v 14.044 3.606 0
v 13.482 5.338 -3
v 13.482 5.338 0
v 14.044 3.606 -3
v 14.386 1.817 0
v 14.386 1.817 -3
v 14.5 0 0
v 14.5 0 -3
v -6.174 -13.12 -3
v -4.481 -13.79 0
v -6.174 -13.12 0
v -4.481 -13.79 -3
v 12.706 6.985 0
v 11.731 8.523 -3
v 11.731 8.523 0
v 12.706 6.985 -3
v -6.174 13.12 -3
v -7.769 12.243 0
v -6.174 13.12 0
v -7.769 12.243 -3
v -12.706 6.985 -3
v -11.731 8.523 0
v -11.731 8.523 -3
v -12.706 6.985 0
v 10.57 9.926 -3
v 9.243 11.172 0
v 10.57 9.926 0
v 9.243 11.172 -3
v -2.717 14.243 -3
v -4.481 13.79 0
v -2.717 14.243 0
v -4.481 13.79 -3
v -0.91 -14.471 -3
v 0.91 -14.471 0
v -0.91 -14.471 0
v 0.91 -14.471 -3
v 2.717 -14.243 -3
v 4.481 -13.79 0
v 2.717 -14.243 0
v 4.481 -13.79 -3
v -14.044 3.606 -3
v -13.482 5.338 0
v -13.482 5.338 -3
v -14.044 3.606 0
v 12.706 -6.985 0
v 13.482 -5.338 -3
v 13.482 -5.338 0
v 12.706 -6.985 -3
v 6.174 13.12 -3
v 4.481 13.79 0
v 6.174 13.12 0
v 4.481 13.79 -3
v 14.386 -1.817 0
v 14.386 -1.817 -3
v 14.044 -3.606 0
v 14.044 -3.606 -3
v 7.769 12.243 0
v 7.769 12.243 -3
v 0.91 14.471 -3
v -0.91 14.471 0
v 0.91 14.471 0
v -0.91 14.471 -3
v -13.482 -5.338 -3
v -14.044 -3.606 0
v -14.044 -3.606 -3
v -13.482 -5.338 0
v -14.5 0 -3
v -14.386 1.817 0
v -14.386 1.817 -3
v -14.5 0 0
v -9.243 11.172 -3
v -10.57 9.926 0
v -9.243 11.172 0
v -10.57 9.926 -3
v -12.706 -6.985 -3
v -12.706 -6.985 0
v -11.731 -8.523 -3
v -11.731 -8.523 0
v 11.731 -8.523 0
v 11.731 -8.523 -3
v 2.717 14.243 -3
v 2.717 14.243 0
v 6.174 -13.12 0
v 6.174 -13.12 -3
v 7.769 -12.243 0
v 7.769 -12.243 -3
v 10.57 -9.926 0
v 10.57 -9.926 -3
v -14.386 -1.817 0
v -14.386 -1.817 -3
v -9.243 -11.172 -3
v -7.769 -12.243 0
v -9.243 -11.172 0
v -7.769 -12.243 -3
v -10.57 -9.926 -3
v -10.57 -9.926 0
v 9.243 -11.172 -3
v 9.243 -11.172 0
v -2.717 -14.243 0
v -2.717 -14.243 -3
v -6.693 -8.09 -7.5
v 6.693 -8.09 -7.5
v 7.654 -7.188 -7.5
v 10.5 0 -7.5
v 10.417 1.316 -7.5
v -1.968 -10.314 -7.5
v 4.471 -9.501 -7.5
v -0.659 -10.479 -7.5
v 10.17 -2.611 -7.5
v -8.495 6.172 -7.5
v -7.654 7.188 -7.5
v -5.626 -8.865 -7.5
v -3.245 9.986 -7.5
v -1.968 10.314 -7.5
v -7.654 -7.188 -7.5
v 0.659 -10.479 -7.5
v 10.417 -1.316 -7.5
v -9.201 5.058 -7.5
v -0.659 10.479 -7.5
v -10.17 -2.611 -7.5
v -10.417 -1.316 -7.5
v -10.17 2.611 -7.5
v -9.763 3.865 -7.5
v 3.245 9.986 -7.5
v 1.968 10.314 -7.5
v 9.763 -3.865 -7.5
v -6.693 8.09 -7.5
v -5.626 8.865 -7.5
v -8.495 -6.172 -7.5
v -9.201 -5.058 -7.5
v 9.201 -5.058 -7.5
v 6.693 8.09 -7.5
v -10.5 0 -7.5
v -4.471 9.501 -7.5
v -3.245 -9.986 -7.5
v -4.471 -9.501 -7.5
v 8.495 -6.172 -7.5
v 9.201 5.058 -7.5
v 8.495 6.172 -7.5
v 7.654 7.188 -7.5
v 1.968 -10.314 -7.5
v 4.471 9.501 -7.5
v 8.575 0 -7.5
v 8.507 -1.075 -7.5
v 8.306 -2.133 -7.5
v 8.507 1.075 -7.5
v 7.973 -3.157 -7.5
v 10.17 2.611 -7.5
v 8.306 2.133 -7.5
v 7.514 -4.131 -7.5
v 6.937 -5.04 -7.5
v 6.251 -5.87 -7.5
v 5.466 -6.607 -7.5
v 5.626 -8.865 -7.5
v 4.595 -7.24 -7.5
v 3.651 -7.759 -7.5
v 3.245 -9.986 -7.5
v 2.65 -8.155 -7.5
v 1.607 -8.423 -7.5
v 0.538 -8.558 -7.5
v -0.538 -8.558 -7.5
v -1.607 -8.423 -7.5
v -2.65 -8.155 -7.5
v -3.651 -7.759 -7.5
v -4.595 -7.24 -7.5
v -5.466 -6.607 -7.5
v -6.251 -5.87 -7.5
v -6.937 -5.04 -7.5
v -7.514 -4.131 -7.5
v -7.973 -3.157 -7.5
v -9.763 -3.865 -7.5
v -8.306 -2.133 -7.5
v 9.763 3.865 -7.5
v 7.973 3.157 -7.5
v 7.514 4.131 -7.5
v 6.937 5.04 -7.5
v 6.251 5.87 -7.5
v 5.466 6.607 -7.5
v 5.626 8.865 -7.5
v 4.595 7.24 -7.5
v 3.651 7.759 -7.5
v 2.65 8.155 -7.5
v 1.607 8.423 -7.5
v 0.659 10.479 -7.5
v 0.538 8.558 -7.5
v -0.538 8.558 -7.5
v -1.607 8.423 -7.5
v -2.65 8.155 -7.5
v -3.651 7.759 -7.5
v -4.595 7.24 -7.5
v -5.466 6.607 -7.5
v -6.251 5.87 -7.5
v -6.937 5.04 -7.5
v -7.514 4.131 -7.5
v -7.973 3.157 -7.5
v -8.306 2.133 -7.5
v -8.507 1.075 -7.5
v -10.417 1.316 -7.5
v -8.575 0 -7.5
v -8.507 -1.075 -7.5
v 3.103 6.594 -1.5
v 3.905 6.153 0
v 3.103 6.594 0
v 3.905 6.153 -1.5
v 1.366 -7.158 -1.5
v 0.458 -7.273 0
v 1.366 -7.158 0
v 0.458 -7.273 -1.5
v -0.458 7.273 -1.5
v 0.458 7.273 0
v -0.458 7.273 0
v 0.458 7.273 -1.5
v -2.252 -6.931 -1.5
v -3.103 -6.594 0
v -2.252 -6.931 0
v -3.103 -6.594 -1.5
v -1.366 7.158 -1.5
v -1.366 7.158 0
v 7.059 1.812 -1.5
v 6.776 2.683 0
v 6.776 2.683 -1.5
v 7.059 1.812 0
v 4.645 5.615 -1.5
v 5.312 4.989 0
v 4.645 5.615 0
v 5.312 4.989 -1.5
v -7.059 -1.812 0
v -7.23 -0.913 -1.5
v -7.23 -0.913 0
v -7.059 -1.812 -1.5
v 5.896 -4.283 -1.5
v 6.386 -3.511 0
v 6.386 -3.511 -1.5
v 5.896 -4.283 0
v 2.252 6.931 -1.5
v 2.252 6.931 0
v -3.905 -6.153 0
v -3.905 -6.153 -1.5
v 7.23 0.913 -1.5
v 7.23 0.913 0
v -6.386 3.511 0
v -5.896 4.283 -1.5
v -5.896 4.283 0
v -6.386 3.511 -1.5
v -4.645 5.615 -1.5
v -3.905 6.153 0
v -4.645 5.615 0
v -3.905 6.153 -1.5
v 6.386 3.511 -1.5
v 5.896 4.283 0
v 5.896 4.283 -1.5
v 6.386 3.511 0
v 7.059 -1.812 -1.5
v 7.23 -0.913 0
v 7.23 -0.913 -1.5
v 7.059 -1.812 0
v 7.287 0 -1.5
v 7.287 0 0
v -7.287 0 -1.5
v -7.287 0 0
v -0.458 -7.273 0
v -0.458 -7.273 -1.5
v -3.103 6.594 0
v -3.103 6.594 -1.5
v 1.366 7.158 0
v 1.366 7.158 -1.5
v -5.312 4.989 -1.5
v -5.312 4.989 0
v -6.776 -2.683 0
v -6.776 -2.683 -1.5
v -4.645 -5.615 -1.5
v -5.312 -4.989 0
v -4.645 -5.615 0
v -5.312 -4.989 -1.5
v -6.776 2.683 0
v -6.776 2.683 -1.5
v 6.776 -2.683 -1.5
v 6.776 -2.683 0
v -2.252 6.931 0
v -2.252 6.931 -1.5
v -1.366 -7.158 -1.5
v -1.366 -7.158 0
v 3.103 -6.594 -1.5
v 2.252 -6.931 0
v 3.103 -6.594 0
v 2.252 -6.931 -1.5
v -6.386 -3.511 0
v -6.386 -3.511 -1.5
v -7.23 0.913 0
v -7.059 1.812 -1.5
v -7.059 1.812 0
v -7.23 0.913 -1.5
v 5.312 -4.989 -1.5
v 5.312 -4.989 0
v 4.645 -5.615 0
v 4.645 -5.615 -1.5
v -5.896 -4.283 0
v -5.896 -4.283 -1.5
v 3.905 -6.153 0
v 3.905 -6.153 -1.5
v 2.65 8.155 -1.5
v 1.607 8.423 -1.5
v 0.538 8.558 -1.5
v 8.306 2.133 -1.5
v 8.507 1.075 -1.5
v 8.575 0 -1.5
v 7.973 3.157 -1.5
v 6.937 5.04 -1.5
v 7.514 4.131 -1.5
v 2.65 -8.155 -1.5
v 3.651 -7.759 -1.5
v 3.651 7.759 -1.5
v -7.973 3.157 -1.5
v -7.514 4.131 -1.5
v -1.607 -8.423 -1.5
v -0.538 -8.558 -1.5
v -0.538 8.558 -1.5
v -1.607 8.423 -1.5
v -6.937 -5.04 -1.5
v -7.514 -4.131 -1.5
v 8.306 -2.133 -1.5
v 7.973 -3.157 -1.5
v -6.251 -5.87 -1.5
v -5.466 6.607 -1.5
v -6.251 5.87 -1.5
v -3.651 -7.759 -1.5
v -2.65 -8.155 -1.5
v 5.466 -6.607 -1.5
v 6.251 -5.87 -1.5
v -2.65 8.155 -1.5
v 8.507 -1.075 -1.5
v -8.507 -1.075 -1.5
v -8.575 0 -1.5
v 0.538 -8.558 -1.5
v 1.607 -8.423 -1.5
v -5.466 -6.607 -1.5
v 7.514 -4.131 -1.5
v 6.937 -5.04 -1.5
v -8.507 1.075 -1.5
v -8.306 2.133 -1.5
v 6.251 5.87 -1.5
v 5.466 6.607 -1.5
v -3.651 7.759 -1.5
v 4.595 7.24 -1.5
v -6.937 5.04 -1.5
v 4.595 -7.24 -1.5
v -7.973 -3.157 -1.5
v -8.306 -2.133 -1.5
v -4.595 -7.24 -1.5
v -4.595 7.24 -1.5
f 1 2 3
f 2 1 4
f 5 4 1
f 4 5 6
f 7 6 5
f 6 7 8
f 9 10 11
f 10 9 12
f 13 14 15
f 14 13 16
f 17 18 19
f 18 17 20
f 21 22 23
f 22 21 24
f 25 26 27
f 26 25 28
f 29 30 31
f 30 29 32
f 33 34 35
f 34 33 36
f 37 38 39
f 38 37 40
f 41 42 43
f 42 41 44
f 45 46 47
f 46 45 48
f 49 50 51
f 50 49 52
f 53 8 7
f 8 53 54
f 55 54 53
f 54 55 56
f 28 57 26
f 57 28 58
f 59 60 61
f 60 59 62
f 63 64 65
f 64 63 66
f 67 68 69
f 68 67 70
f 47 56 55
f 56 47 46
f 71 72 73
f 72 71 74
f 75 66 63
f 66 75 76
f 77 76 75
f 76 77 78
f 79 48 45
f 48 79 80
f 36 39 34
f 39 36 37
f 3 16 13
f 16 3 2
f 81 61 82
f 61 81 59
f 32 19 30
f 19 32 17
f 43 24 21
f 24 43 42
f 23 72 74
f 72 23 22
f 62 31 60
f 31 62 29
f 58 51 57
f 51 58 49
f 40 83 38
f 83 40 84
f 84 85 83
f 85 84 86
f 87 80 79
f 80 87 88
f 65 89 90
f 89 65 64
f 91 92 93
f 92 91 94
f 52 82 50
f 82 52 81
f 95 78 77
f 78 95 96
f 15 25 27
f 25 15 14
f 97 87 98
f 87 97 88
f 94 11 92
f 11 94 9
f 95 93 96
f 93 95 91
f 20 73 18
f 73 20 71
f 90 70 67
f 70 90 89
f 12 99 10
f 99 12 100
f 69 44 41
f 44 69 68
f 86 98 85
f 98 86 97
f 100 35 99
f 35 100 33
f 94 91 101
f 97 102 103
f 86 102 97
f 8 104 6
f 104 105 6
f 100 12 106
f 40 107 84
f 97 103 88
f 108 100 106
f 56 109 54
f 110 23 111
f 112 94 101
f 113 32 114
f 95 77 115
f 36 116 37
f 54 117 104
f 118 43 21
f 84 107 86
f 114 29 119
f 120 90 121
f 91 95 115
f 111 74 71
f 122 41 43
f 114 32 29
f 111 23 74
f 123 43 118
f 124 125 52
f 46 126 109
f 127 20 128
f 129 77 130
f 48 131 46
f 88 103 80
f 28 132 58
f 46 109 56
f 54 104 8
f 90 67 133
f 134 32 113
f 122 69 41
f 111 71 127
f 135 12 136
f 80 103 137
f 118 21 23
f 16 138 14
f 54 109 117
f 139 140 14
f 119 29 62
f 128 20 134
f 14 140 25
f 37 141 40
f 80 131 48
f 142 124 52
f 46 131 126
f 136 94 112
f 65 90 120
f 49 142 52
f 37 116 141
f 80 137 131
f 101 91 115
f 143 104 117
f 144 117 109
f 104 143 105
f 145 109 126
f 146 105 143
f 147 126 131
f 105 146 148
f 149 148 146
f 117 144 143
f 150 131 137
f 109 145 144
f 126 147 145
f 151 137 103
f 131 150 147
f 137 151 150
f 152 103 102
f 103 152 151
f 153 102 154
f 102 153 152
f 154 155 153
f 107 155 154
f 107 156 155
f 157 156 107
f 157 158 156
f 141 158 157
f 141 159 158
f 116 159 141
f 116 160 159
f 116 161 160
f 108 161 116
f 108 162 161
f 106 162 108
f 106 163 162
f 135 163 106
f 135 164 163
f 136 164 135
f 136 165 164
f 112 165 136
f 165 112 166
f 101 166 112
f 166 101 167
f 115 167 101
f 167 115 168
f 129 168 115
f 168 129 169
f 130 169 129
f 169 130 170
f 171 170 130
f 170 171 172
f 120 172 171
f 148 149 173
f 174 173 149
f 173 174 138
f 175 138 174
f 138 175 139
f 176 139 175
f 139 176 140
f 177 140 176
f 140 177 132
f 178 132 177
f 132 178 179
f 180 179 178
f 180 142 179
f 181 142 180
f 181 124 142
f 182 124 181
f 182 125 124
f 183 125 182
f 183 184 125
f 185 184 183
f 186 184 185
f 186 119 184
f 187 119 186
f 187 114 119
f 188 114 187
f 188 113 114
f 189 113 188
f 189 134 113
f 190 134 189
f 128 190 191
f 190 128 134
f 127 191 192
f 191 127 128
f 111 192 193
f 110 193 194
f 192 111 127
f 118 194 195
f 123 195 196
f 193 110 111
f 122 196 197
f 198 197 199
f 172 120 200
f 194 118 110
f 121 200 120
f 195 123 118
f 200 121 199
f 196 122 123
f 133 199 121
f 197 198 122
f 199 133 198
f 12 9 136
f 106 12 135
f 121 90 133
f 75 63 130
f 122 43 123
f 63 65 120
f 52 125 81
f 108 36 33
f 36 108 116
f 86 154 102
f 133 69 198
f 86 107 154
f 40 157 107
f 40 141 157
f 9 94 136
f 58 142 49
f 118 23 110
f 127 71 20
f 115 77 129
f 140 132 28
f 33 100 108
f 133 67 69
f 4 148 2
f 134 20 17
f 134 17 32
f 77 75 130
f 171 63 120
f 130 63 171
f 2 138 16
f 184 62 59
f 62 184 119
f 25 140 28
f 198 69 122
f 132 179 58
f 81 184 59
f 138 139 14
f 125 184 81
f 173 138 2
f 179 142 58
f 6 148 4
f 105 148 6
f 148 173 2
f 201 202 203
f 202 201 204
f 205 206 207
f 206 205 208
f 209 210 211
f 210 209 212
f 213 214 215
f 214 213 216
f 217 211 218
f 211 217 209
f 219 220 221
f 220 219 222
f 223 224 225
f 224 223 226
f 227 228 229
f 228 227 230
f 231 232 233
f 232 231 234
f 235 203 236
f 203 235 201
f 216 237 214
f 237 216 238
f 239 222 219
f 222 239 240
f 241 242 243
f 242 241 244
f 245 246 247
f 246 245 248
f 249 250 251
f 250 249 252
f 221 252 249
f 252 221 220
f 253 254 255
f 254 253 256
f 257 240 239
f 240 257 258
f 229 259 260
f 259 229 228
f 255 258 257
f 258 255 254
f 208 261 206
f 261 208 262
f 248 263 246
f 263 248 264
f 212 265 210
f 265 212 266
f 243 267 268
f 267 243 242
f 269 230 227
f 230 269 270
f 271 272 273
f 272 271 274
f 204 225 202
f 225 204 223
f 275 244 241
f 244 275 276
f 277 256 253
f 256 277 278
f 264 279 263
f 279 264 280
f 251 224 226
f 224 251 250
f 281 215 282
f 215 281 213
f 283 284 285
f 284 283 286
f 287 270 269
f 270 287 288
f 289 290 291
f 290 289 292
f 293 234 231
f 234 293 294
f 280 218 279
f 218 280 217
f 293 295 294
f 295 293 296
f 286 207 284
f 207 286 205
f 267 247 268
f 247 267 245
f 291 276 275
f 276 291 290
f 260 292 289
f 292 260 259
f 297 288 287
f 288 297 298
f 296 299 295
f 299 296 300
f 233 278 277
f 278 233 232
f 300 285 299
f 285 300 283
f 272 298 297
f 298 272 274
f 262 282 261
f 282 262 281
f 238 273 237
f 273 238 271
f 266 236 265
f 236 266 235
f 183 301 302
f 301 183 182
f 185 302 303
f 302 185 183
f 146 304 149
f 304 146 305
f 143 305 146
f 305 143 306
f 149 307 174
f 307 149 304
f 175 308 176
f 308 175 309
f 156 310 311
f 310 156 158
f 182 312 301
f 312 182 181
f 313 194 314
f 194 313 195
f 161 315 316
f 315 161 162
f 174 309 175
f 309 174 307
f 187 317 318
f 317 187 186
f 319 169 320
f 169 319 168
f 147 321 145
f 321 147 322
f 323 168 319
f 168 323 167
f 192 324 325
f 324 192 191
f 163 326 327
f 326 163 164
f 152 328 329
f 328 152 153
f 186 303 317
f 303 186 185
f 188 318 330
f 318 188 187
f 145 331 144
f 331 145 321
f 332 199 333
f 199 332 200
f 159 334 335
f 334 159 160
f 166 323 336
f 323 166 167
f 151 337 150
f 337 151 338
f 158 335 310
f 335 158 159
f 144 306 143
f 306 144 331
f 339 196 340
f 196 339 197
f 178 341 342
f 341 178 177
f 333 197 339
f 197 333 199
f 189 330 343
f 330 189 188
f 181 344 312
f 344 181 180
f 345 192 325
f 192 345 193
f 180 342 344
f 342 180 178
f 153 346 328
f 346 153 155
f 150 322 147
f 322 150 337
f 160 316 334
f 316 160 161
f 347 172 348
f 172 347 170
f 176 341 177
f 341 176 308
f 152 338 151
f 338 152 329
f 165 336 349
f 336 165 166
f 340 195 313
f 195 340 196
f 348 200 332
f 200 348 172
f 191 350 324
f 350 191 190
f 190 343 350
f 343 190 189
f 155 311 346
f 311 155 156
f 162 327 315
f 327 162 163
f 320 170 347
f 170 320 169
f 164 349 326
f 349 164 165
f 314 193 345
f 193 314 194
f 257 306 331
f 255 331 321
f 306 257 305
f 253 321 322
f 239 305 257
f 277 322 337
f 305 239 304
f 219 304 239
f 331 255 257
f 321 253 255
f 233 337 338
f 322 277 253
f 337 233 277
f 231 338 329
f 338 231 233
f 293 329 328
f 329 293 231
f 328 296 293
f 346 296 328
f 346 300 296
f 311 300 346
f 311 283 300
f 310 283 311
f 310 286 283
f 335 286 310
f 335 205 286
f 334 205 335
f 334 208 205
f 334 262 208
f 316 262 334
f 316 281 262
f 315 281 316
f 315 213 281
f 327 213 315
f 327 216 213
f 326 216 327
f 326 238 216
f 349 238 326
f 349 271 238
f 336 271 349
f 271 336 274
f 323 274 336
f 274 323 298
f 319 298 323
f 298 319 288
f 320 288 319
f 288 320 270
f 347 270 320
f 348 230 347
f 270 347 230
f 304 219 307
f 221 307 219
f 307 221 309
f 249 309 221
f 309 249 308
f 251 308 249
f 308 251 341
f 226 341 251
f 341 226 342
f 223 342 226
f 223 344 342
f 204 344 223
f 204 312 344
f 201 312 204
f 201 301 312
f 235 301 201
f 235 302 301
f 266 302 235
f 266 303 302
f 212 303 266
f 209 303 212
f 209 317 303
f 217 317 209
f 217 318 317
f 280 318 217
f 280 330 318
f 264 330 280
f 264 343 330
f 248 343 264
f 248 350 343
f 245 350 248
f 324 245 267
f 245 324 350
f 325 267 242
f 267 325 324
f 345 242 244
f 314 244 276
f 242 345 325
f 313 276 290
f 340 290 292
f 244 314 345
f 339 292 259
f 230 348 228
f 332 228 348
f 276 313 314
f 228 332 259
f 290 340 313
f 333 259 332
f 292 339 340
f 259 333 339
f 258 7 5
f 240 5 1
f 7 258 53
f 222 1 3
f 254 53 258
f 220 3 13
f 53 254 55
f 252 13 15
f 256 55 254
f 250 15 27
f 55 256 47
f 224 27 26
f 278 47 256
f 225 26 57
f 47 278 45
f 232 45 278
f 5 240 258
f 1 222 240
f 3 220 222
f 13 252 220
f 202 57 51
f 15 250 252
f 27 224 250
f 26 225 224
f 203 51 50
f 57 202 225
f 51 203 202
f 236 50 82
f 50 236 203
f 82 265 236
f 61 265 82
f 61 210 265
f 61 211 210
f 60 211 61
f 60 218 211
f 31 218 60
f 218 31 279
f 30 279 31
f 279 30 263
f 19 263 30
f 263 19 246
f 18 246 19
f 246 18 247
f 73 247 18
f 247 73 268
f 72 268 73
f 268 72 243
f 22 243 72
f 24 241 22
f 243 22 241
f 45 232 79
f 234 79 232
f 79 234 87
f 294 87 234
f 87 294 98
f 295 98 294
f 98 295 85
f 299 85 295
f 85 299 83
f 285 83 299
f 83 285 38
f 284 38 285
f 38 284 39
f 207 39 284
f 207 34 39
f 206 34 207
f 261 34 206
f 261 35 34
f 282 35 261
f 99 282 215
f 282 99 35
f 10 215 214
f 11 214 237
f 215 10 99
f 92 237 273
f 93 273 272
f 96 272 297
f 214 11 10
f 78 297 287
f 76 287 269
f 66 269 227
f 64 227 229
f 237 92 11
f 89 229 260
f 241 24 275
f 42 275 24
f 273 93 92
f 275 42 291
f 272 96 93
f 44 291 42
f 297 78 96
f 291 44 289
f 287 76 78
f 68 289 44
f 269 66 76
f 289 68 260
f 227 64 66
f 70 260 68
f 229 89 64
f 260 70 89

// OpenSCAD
$fn = 50;


difference() {
	union() {
		translate(v = [0, 0, -3.0000000000]) {
			cylinder(h = 6, r = 14.5000000000);
		}
		translate(v = [0, 0, 3.0000000000]) {
			cylinder(h = 4.5000000000, r1 = 14.5000000000, r2 = 10.5000000000);
		}
		translate(v = [0, 0, -7.5000000000]) {
			cylinder(h = 4.5000000000, r1 = 10.5000000000, r2 = 14.5000000000);
		}
	}
	union() {
		translate(v = [0, 0, -100.0000000000]) {
			cylinder(h = 200, r = 5);
		}
		translate(v = [0, 0, 4.5000000000]) {
			translate(v = [0, 0, -3.0000000000]) {
				union() {
					difference() {
						#cylinder(h = 6, r = 8.5750000000);
						#cylinder(h = 6, r = 3.0000000000);
					}
					difference() {
						#translate(v = [0, 0, -50]) {
							cylinder(h = 100, r = 7.2875000000);
						}
					}
				}
			}
		}
		translate(v = [0, 0, -4.5000000000]) {
			translate(v = [0, 0, -3.0000000000]) {
				union() {
					difference() {
						#cylinder(h = 6, r = 8.5750000000);
						#cylinder(h = 6, r = 3.0000000000);
					}
					difference() {
						#translate(v = [0, 0, -50]) {
							cylinder(h = 100, r = 7.2875000000);
						}
					}
				}
			}
		}
		translate(v = [-250.0000000000, -250.0000000000, 0]) {
			cube(size = [500, 500, 500]);
		}
		translate(v = [-250.0000000000, -250.0000000000, 0]) {
			cube(size = [500, 500, 500]);
		}
		translate(v = [-250.0000000000, -250.0000000000, 0]) {
			cube(size = [500, 500, 500]);
		}
	}
}
